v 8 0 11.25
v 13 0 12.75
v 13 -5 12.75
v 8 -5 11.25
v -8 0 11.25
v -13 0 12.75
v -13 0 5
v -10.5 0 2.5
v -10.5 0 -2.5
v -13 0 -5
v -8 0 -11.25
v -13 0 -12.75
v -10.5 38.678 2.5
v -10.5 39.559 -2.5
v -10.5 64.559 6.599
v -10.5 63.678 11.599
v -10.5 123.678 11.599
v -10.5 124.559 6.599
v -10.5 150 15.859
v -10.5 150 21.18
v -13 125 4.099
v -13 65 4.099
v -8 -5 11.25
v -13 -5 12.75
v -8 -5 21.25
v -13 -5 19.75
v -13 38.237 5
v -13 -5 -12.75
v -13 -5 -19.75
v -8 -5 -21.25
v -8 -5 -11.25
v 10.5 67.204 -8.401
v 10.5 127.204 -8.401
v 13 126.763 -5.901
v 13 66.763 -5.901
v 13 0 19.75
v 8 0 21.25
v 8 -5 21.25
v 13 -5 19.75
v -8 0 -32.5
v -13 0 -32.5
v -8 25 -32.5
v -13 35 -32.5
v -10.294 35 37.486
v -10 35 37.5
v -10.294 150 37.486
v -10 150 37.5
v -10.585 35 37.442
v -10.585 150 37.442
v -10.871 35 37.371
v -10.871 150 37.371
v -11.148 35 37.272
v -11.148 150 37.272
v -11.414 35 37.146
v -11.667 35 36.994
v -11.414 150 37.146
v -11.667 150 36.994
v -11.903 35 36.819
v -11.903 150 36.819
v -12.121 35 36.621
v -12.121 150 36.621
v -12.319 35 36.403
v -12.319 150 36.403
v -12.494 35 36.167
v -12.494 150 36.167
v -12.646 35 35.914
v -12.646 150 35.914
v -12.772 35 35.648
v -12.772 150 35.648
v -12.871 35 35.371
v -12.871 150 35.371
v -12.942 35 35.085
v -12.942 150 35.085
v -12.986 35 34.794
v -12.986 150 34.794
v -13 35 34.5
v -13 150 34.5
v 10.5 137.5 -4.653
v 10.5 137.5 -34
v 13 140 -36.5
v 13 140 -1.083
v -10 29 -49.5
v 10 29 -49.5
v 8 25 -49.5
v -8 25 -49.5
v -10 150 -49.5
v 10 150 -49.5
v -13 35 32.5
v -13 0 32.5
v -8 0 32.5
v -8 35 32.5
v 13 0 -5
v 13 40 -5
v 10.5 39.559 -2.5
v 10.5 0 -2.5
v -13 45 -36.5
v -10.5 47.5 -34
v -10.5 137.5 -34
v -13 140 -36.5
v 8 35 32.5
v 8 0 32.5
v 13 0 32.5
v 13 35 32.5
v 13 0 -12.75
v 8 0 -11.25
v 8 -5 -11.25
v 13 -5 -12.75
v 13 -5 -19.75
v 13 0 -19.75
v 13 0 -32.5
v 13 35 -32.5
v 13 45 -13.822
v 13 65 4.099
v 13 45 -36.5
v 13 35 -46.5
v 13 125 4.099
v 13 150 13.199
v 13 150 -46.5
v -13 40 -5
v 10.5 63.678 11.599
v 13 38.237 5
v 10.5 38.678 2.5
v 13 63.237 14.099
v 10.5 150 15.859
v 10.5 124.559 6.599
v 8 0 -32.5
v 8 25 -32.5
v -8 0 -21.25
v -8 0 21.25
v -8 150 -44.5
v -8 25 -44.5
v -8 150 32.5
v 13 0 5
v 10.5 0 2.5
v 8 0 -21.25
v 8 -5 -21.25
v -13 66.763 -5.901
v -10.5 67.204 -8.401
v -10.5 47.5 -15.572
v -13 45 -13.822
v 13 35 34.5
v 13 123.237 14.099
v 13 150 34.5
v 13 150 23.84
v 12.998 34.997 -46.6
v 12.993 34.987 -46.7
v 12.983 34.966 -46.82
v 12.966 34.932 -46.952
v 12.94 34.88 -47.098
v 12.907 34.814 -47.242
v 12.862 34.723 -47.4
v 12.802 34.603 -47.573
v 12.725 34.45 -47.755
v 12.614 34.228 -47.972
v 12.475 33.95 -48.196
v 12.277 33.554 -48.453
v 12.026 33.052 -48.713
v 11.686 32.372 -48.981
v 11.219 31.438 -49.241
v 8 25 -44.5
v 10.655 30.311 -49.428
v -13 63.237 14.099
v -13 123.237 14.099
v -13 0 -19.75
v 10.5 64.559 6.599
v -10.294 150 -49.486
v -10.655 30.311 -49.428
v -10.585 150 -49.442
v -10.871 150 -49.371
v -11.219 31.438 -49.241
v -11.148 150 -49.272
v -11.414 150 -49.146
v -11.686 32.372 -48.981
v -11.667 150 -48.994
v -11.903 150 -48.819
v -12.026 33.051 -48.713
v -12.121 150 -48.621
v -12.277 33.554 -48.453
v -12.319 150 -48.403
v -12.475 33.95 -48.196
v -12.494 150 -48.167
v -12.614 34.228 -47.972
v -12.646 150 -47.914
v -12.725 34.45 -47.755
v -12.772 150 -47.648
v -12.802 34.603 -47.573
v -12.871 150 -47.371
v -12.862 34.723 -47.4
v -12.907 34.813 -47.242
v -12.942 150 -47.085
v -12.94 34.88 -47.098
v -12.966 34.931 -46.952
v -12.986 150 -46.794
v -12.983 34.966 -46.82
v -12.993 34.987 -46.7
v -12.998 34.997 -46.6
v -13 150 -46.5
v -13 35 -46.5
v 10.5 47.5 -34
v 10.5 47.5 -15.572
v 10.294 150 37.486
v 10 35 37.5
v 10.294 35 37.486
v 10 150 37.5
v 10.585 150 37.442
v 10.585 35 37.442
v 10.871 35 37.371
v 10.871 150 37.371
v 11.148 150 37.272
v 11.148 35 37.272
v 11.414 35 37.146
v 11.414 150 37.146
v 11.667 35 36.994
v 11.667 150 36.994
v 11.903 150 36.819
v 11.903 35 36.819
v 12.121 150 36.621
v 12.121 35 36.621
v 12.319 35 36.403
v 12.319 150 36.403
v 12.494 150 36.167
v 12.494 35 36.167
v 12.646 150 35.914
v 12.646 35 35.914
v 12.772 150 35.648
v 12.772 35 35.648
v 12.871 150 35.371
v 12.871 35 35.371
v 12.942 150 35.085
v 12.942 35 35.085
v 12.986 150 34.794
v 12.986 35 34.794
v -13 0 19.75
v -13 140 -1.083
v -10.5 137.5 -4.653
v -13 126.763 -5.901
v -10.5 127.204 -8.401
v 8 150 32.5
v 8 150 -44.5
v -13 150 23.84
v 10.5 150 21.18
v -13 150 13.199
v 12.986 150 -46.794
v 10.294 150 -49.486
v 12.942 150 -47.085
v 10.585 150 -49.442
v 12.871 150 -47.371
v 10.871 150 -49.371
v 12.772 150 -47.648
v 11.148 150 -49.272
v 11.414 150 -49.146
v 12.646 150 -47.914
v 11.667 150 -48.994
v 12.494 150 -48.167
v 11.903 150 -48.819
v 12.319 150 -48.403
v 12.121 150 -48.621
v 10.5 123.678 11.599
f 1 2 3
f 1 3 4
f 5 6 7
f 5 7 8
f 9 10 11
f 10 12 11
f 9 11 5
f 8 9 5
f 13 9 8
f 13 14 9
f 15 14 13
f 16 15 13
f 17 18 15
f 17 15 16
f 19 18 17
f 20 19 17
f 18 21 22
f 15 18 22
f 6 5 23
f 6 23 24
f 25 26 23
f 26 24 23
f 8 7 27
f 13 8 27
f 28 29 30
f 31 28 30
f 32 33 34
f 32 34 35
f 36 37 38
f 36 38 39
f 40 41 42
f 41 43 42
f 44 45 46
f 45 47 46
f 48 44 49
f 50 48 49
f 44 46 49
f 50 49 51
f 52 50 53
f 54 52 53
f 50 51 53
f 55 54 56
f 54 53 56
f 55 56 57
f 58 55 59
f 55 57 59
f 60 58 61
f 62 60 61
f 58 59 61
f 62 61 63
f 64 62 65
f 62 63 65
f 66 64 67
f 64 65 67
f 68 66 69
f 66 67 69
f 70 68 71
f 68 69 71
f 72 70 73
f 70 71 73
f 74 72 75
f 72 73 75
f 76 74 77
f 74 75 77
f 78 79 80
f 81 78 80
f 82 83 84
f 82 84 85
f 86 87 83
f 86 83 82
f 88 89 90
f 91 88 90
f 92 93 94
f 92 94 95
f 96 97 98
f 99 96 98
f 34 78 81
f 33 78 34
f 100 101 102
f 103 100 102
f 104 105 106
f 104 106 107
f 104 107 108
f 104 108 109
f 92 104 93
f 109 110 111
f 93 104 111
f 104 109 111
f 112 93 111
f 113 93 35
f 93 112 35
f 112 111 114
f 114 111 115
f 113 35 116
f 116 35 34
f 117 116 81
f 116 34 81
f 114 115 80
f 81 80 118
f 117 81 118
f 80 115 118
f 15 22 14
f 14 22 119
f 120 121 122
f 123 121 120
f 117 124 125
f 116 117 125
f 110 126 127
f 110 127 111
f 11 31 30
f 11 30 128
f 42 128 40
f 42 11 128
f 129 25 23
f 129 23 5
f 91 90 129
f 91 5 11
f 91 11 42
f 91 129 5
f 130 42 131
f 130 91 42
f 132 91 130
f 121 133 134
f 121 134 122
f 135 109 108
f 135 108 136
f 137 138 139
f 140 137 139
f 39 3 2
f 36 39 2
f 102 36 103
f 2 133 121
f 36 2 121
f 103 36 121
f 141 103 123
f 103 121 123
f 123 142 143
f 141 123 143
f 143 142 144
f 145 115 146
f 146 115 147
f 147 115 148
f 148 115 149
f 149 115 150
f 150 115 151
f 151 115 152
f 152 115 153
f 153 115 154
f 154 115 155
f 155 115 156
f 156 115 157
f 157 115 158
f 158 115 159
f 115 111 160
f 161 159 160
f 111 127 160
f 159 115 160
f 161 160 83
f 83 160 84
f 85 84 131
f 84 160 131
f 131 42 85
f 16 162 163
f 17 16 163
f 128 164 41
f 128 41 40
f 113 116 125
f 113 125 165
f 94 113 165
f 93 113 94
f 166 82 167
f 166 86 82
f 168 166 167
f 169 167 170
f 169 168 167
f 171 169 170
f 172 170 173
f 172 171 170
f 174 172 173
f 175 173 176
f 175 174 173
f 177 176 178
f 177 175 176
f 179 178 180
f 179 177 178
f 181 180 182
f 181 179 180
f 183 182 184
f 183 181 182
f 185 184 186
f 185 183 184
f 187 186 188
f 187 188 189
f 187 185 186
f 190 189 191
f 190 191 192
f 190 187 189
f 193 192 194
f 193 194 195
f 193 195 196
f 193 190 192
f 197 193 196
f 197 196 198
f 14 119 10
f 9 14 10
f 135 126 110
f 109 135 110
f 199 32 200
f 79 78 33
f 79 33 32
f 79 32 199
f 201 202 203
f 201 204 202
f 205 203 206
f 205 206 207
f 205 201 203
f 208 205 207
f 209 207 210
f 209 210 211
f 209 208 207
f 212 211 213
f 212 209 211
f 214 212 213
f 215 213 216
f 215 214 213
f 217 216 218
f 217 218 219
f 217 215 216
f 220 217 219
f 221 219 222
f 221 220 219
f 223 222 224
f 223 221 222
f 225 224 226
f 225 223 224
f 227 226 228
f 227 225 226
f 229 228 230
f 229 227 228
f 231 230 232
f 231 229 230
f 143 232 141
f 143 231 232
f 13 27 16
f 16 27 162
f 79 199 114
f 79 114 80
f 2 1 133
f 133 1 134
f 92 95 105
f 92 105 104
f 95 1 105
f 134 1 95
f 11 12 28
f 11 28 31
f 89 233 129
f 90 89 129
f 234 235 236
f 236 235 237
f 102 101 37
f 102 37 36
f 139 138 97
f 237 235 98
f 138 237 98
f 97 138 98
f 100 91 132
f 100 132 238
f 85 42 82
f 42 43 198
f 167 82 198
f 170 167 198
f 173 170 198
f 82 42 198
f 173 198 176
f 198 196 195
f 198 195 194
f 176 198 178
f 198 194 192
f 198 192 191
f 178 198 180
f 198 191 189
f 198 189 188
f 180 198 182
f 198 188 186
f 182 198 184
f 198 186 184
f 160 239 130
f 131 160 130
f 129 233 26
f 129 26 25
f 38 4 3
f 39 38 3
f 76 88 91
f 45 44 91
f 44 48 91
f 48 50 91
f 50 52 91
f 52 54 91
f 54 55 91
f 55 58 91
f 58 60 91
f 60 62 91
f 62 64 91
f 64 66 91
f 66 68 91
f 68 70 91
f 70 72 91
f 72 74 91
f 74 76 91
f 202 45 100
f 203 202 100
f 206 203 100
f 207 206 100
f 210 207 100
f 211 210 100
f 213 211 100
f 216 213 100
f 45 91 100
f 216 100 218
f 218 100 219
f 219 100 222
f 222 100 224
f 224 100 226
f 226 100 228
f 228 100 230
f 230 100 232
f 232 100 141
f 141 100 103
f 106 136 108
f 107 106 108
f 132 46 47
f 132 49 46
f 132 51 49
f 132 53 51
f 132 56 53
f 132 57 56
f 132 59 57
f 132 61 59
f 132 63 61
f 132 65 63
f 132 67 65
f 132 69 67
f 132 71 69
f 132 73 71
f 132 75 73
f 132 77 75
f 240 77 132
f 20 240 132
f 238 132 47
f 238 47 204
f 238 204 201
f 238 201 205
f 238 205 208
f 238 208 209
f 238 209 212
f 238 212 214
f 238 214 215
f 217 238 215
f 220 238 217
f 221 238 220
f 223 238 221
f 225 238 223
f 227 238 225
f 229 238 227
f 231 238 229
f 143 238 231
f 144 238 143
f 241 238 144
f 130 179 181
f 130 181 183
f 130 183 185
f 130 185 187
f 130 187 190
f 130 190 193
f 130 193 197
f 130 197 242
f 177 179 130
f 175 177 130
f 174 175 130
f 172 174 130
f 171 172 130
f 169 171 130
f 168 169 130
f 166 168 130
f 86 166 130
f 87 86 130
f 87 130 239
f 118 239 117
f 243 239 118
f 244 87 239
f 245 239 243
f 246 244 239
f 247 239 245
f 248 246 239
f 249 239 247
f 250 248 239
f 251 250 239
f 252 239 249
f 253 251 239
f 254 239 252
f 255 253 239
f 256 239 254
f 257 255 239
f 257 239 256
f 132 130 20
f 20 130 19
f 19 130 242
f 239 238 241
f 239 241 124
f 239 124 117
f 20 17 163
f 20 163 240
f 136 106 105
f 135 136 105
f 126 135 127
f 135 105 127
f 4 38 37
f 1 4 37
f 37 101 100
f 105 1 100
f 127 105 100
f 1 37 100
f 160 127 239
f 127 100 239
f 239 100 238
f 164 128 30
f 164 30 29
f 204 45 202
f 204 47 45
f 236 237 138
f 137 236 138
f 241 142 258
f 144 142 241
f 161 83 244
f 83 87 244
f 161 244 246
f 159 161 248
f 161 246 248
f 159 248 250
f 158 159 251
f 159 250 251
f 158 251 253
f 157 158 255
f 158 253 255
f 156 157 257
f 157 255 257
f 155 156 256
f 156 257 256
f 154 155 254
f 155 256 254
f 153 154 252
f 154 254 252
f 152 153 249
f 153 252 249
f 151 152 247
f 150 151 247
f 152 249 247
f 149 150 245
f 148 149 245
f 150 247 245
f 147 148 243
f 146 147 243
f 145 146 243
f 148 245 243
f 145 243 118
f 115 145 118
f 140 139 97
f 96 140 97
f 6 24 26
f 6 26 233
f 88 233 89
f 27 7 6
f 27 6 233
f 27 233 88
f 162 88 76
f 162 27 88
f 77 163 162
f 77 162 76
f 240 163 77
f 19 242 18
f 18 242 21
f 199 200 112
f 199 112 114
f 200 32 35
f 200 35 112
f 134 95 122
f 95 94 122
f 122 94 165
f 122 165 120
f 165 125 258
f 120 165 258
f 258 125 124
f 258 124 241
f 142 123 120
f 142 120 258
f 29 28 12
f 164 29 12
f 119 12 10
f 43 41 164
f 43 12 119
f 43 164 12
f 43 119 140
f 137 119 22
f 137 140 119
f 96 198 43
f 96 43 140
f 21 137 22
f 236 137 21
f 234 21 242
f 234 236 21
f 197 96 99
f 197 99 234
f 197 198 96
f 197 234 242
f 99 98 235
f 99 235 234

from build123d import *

# Parameters (mm, degrees)
BOSS_EXTRUDE1_DEPTH      = 5
BOSS_EXTRUDE1_2_DEPTH    = 5
BOSS_EXTRUDE1_3_DEPTH    = 5
BOSS_EXTRUDE1_4_DEPTH    = 5
SKETCH5_W                = 5
SKETCH5_H                = 65
BOSS_EXTRUDE6_DEPTH      = 150
SKETCH6_W                = 5
SKETCH6_H                = 125
BOSS_EXTRUDE7_DEPTH      = 12
SKETCH9_W                = 26
SKETCH9_H                = 125
BOSS_EXTRUDE9_DEPTH      = 5
SKETCH7_W                = 26
SKETCH7_H                = 115
BOSS_EXTRUDE8_DEPTH      = 5
CHAMFER1_SIZE            = 10
CHAMFER1_SIZE2           = 5
CHAMFER2_SIZE2           = 10
CHAMFER2_SIZE            = 5
FILLET1_R                = 3
CUT_EXTRUDE2_DEPTH       = 2.5
CUT_EXTRUDE3_DEPTH       = 2.5
CHAMFER3_SIZE            = 2.5
CHAMFER3_OF_MIRROR1_SIZE = 2.5


with BuildPart() as part:
    # Sketch1 → Boss-Extrude1 (new body)
    with BuildSketch(Plane(origin=(0, 0, 0), x_dir=(1, 0, 0), z_dir=(0, 1, 0))):
        Polygon((-13, 19.75), (-13, 12.75), (-8, 11.25), (-8, 21.25), align=None)
    extrude(amount=-BOSS_EXTRUDE1_DEPTH)



with BuildPart() as body_2:
    # Sketch1 → Boss-Extrude1 2 (new body)
    with BuildSketch(Plane(origin=(0, 0, 0), x_dir=(1, 0, 0), z_dir=(0, 1, 0))):
        Polygon((-13, -19.75), (-8, -21.25), (-8, -11.25), (-13, -12.75), align=None)
    extrude(amount=-BOSS_EXTRUDE1_2_DEPTH)


with BuildPart() as body_3:
    # Sketch1 → Boss-Extrude1 3 (new body)
    with BuildSketch(Plane(origin=(0, 0, 0), x_dir=(1, 0, 0), z_dir=(0, 1, 0))):
        Polygon((13, 19.75), (8, 21.25), (8, 11.25), (13, 12.75), align=None)
    extrude(amount=-BOSS_EXTRUDE1_3_DEPTH)


with BuildPart() as body_4:
    # Sketch1 → Boss-Extrude1 4 (new body)
    with BuildSketch(Plane(origin=(0, 0, 0), x_dir=(1, 0, 0), z_dir=(0, 1, 0))):
        Polygon((13, -19.75), (13, -12.75), (8, -11.25), (8, -21.25), align=None)
    extrude(amount=-BOSS_EXTRUDE1_4_DEPTH)


with BuildPart() as part_1:
    add(part.part)

    add(body_2.part)  # Boss-Extrude6 merges body 2

    add(body_3.part)  # Boss-Extrude6 merges body 3

    add(body_4.part)  # Boss-Extrude6 merges body 4
    # Sketch5 → Boss-Extrude6 (add)
    with BuildSketch(Plane(origin=(0, 0, 0), x_dir=(1, 0, 0), z_dir=(0, 1, 0))):
        with Locations((-10.5, 0)):
            Rectangle(SKETCH5_W, SKETCH5_H)
        with Locations((10.5, 0)):
            Rectangle(SKETCH5_W, SKETCH5_H)
    extrude(amount=BOSS_EXTRUDE6_DEPTH)

    # Sketch6 → Boss-Extrude7 (add)
    with BuildSketch(Plane(origin=(0, 0, -32.5), x_dir=(-1, 0, 0), z_dir=(0, 0, -1))):
        with Locations((-10.5, 87.5)):
            Rectangle(SKETCH6_W, SKETCH6_H)
        with Locations((10.5, 87.5)):
            Rectangle(SKETCH6_W, SKETCH6_H)
    extrude(amount=BOSS_EXTRUDE7_DEPTH)

    # Sketch9 → Boss-Extrude9 (add)
    with BuildSketch(Plane(origin=(0, 0, -44.5), x_dir=(-1, 0, 0), z_dir=(0, 0, -1))):
        with Locations((0, 87.5)):
            Rectangle(SKETCH9_W, SKETCH9_H)
    extrude(amount=BOSS_EXTRUDE9_DEPTH)

    # Sketch7 → Boss-Extrude8 (add)
    with BuildSketch(Plane.XY.offset(32.5)):
        with Locations((0, 92.5)):
            Rectangle(SKETCH7_W, SKETCH7_H)
    extrude(amount=BOSS_EXTRUDE8_DEPTH)

    # Chamfer1
    chamfer1_edges = [part_1.edges().sort_by_distance(p)[0] for p in [
        (13, 25, -41),
    ]]
    chamfer1_side = [part_1.faces().sort_by_distance(p)[0] for p in [
        (13, 77.49201278, -5.3514377),
    ]]
    chamfer(chamfer1_edges, length=CHAMFER1_SIZE, length2=CHAMFER1_SIZE2, reference=chamfer1_side[0])

    # Chamfer2
    chamfer2_edges = [part_1.edges().sort_by_distance(p)[0] for p in [
        (-13, 25, -41),
    ]]
    chamfer2_side = [part_1.faces().sort_by_distance(p)[0] for p in [
        (-12.9, 25, -41),
    ]]
    chamfer(chamfer2_edges, length=CHAMFER2_SIZE - 0.0001, length2=CHAMFER2_SIZE2 - 0.0001, reference=chamfer2_side[0])  # a hair under: the kernel refuses the full size

    # Fillet1
    fillet1_edges = [part_1.edges().sort_by_distance(p)[0] for p in [
        (-13, 92.49995, -49.5),
        (13, 92.5, -49.5),
        (13, 92.5, 37.5),
        (-13, 92.5, 37.5),
    ]]
    fillet(fillet1_edges, radius=FILLET1_R)

    # Sketch13 → Cut-Extrude2 (cut)
    with BuildSketch(Plane.ZY.offset(13)):
        Polygon((13.198511713, 150), (4.099255857, 125), (4.099255857, 65), (-5, 40), (-5, 0), (5, 0), (5, 38.236730193), (14.099255857, 63.236730193), (14.099255857, 123.236730193), (23.840289438, 150), align=None)
    cut_extrude2 = extrude(amount=-CUT_EXTRUDE2_DEPTH, mode=Mode.SUBTRACT)

    # Sketch15 → Cut-Extrude3 (cut)
    with BuildSketch(Plane.ZY.offset(13)):
        Polygon((-5.900744143, 66.763269807), (-13.821926553, 45), (-36.5, 45), (-36.5, 140), (-1.082968354, 140), (-5.900744143, 126.763269807), align=None)
    cut_extrude3 = extrude(amount=-CUT_EXTRUDE3_DEPTH, mode=Mode.SUBTRACT)

    # Chamfer3
    chamfer3_edges = [part_1.edges().sort_by_distance(p)[0] for p in [
        (-10.5, 136.618365096, 18.969772647),
        (-10.5, 93.236730193, 14.099255857),
        (-10.5, 50.736730193, 9.549627928),
        (-10.5, 19.118365096, 5),
        (-10.5, 20, -5),
        (-10.5, 52.5, -0.450372072),
        (-10.5, 95, 4.099255857),
        (-10.5, 137.5, 8.648883785),
        (-10.5, 45, -25.160963277),
        (-10.5, 55.881634904, -9.861335348),
        (-10.5, 96.763269807, -5.900744143),
        (-10.5, 133.381634904, -3.491856249),
        (-10.5, 92.5, -36.5),
        (-10.5, 140, -18.791484177),
    ]]
    chamfer(chamfer3_edges, length=CHAMFER3_SIZE - 0.0001)  # a hair under: the kernel refuses the full size

    # Mirror1: Cut-Extrude2, Cut-Extrude3 across plane
    add(cut_extrude2.mirror(Plane(origin=(0, 0, 0), x_dir=(0, 0, 1), z_dir=(1, 0, 0))), mode=Mode.SUBTRACT)
    add(cut_extrude3.mirror(Plane(origin=(0, 0, 0), x_dir=(0, 0, 1), z_dir=(1, 0, 0))), mode=Mode.SUBTRACT)

    # Chamfer3 of Mirror1
    chamfer3_of_mirror1_edges = [part_1.edges().sort_by_distance(p)[0] for p in [
        (10.5, 136.618365096, 18.969772647),
        (10.5, 93.236730193, 14.099255857),
        (10.5, 50.736730193, 9.549627928),
        (10.5, 19.118365096, 5),
        (10.5, 20, -5),
        (10.5, 52.5, -0.450372072),
        (10.5, 95, 4.099255857),
        (10.5, 137.5, 8.648883785),
        (10.5, 45, -25.160963277),
        (10.5, 55.881634904, -9.861335348),
        (10.5, 96.763269807, -5.900744143),
        (10.5, 133.381634904, -3.491856249),
        (10.5, 92.5, -36.5),
        (10.5, 140, -18.791484177),
    ]]
    chamfer(chamfer3_of_mirror1_edges, length=CHAMFER3_OF_MIRROR1_SIZE - 0.0001)  # a hair under: the kernel refuses the full size


solid = part_1.part
